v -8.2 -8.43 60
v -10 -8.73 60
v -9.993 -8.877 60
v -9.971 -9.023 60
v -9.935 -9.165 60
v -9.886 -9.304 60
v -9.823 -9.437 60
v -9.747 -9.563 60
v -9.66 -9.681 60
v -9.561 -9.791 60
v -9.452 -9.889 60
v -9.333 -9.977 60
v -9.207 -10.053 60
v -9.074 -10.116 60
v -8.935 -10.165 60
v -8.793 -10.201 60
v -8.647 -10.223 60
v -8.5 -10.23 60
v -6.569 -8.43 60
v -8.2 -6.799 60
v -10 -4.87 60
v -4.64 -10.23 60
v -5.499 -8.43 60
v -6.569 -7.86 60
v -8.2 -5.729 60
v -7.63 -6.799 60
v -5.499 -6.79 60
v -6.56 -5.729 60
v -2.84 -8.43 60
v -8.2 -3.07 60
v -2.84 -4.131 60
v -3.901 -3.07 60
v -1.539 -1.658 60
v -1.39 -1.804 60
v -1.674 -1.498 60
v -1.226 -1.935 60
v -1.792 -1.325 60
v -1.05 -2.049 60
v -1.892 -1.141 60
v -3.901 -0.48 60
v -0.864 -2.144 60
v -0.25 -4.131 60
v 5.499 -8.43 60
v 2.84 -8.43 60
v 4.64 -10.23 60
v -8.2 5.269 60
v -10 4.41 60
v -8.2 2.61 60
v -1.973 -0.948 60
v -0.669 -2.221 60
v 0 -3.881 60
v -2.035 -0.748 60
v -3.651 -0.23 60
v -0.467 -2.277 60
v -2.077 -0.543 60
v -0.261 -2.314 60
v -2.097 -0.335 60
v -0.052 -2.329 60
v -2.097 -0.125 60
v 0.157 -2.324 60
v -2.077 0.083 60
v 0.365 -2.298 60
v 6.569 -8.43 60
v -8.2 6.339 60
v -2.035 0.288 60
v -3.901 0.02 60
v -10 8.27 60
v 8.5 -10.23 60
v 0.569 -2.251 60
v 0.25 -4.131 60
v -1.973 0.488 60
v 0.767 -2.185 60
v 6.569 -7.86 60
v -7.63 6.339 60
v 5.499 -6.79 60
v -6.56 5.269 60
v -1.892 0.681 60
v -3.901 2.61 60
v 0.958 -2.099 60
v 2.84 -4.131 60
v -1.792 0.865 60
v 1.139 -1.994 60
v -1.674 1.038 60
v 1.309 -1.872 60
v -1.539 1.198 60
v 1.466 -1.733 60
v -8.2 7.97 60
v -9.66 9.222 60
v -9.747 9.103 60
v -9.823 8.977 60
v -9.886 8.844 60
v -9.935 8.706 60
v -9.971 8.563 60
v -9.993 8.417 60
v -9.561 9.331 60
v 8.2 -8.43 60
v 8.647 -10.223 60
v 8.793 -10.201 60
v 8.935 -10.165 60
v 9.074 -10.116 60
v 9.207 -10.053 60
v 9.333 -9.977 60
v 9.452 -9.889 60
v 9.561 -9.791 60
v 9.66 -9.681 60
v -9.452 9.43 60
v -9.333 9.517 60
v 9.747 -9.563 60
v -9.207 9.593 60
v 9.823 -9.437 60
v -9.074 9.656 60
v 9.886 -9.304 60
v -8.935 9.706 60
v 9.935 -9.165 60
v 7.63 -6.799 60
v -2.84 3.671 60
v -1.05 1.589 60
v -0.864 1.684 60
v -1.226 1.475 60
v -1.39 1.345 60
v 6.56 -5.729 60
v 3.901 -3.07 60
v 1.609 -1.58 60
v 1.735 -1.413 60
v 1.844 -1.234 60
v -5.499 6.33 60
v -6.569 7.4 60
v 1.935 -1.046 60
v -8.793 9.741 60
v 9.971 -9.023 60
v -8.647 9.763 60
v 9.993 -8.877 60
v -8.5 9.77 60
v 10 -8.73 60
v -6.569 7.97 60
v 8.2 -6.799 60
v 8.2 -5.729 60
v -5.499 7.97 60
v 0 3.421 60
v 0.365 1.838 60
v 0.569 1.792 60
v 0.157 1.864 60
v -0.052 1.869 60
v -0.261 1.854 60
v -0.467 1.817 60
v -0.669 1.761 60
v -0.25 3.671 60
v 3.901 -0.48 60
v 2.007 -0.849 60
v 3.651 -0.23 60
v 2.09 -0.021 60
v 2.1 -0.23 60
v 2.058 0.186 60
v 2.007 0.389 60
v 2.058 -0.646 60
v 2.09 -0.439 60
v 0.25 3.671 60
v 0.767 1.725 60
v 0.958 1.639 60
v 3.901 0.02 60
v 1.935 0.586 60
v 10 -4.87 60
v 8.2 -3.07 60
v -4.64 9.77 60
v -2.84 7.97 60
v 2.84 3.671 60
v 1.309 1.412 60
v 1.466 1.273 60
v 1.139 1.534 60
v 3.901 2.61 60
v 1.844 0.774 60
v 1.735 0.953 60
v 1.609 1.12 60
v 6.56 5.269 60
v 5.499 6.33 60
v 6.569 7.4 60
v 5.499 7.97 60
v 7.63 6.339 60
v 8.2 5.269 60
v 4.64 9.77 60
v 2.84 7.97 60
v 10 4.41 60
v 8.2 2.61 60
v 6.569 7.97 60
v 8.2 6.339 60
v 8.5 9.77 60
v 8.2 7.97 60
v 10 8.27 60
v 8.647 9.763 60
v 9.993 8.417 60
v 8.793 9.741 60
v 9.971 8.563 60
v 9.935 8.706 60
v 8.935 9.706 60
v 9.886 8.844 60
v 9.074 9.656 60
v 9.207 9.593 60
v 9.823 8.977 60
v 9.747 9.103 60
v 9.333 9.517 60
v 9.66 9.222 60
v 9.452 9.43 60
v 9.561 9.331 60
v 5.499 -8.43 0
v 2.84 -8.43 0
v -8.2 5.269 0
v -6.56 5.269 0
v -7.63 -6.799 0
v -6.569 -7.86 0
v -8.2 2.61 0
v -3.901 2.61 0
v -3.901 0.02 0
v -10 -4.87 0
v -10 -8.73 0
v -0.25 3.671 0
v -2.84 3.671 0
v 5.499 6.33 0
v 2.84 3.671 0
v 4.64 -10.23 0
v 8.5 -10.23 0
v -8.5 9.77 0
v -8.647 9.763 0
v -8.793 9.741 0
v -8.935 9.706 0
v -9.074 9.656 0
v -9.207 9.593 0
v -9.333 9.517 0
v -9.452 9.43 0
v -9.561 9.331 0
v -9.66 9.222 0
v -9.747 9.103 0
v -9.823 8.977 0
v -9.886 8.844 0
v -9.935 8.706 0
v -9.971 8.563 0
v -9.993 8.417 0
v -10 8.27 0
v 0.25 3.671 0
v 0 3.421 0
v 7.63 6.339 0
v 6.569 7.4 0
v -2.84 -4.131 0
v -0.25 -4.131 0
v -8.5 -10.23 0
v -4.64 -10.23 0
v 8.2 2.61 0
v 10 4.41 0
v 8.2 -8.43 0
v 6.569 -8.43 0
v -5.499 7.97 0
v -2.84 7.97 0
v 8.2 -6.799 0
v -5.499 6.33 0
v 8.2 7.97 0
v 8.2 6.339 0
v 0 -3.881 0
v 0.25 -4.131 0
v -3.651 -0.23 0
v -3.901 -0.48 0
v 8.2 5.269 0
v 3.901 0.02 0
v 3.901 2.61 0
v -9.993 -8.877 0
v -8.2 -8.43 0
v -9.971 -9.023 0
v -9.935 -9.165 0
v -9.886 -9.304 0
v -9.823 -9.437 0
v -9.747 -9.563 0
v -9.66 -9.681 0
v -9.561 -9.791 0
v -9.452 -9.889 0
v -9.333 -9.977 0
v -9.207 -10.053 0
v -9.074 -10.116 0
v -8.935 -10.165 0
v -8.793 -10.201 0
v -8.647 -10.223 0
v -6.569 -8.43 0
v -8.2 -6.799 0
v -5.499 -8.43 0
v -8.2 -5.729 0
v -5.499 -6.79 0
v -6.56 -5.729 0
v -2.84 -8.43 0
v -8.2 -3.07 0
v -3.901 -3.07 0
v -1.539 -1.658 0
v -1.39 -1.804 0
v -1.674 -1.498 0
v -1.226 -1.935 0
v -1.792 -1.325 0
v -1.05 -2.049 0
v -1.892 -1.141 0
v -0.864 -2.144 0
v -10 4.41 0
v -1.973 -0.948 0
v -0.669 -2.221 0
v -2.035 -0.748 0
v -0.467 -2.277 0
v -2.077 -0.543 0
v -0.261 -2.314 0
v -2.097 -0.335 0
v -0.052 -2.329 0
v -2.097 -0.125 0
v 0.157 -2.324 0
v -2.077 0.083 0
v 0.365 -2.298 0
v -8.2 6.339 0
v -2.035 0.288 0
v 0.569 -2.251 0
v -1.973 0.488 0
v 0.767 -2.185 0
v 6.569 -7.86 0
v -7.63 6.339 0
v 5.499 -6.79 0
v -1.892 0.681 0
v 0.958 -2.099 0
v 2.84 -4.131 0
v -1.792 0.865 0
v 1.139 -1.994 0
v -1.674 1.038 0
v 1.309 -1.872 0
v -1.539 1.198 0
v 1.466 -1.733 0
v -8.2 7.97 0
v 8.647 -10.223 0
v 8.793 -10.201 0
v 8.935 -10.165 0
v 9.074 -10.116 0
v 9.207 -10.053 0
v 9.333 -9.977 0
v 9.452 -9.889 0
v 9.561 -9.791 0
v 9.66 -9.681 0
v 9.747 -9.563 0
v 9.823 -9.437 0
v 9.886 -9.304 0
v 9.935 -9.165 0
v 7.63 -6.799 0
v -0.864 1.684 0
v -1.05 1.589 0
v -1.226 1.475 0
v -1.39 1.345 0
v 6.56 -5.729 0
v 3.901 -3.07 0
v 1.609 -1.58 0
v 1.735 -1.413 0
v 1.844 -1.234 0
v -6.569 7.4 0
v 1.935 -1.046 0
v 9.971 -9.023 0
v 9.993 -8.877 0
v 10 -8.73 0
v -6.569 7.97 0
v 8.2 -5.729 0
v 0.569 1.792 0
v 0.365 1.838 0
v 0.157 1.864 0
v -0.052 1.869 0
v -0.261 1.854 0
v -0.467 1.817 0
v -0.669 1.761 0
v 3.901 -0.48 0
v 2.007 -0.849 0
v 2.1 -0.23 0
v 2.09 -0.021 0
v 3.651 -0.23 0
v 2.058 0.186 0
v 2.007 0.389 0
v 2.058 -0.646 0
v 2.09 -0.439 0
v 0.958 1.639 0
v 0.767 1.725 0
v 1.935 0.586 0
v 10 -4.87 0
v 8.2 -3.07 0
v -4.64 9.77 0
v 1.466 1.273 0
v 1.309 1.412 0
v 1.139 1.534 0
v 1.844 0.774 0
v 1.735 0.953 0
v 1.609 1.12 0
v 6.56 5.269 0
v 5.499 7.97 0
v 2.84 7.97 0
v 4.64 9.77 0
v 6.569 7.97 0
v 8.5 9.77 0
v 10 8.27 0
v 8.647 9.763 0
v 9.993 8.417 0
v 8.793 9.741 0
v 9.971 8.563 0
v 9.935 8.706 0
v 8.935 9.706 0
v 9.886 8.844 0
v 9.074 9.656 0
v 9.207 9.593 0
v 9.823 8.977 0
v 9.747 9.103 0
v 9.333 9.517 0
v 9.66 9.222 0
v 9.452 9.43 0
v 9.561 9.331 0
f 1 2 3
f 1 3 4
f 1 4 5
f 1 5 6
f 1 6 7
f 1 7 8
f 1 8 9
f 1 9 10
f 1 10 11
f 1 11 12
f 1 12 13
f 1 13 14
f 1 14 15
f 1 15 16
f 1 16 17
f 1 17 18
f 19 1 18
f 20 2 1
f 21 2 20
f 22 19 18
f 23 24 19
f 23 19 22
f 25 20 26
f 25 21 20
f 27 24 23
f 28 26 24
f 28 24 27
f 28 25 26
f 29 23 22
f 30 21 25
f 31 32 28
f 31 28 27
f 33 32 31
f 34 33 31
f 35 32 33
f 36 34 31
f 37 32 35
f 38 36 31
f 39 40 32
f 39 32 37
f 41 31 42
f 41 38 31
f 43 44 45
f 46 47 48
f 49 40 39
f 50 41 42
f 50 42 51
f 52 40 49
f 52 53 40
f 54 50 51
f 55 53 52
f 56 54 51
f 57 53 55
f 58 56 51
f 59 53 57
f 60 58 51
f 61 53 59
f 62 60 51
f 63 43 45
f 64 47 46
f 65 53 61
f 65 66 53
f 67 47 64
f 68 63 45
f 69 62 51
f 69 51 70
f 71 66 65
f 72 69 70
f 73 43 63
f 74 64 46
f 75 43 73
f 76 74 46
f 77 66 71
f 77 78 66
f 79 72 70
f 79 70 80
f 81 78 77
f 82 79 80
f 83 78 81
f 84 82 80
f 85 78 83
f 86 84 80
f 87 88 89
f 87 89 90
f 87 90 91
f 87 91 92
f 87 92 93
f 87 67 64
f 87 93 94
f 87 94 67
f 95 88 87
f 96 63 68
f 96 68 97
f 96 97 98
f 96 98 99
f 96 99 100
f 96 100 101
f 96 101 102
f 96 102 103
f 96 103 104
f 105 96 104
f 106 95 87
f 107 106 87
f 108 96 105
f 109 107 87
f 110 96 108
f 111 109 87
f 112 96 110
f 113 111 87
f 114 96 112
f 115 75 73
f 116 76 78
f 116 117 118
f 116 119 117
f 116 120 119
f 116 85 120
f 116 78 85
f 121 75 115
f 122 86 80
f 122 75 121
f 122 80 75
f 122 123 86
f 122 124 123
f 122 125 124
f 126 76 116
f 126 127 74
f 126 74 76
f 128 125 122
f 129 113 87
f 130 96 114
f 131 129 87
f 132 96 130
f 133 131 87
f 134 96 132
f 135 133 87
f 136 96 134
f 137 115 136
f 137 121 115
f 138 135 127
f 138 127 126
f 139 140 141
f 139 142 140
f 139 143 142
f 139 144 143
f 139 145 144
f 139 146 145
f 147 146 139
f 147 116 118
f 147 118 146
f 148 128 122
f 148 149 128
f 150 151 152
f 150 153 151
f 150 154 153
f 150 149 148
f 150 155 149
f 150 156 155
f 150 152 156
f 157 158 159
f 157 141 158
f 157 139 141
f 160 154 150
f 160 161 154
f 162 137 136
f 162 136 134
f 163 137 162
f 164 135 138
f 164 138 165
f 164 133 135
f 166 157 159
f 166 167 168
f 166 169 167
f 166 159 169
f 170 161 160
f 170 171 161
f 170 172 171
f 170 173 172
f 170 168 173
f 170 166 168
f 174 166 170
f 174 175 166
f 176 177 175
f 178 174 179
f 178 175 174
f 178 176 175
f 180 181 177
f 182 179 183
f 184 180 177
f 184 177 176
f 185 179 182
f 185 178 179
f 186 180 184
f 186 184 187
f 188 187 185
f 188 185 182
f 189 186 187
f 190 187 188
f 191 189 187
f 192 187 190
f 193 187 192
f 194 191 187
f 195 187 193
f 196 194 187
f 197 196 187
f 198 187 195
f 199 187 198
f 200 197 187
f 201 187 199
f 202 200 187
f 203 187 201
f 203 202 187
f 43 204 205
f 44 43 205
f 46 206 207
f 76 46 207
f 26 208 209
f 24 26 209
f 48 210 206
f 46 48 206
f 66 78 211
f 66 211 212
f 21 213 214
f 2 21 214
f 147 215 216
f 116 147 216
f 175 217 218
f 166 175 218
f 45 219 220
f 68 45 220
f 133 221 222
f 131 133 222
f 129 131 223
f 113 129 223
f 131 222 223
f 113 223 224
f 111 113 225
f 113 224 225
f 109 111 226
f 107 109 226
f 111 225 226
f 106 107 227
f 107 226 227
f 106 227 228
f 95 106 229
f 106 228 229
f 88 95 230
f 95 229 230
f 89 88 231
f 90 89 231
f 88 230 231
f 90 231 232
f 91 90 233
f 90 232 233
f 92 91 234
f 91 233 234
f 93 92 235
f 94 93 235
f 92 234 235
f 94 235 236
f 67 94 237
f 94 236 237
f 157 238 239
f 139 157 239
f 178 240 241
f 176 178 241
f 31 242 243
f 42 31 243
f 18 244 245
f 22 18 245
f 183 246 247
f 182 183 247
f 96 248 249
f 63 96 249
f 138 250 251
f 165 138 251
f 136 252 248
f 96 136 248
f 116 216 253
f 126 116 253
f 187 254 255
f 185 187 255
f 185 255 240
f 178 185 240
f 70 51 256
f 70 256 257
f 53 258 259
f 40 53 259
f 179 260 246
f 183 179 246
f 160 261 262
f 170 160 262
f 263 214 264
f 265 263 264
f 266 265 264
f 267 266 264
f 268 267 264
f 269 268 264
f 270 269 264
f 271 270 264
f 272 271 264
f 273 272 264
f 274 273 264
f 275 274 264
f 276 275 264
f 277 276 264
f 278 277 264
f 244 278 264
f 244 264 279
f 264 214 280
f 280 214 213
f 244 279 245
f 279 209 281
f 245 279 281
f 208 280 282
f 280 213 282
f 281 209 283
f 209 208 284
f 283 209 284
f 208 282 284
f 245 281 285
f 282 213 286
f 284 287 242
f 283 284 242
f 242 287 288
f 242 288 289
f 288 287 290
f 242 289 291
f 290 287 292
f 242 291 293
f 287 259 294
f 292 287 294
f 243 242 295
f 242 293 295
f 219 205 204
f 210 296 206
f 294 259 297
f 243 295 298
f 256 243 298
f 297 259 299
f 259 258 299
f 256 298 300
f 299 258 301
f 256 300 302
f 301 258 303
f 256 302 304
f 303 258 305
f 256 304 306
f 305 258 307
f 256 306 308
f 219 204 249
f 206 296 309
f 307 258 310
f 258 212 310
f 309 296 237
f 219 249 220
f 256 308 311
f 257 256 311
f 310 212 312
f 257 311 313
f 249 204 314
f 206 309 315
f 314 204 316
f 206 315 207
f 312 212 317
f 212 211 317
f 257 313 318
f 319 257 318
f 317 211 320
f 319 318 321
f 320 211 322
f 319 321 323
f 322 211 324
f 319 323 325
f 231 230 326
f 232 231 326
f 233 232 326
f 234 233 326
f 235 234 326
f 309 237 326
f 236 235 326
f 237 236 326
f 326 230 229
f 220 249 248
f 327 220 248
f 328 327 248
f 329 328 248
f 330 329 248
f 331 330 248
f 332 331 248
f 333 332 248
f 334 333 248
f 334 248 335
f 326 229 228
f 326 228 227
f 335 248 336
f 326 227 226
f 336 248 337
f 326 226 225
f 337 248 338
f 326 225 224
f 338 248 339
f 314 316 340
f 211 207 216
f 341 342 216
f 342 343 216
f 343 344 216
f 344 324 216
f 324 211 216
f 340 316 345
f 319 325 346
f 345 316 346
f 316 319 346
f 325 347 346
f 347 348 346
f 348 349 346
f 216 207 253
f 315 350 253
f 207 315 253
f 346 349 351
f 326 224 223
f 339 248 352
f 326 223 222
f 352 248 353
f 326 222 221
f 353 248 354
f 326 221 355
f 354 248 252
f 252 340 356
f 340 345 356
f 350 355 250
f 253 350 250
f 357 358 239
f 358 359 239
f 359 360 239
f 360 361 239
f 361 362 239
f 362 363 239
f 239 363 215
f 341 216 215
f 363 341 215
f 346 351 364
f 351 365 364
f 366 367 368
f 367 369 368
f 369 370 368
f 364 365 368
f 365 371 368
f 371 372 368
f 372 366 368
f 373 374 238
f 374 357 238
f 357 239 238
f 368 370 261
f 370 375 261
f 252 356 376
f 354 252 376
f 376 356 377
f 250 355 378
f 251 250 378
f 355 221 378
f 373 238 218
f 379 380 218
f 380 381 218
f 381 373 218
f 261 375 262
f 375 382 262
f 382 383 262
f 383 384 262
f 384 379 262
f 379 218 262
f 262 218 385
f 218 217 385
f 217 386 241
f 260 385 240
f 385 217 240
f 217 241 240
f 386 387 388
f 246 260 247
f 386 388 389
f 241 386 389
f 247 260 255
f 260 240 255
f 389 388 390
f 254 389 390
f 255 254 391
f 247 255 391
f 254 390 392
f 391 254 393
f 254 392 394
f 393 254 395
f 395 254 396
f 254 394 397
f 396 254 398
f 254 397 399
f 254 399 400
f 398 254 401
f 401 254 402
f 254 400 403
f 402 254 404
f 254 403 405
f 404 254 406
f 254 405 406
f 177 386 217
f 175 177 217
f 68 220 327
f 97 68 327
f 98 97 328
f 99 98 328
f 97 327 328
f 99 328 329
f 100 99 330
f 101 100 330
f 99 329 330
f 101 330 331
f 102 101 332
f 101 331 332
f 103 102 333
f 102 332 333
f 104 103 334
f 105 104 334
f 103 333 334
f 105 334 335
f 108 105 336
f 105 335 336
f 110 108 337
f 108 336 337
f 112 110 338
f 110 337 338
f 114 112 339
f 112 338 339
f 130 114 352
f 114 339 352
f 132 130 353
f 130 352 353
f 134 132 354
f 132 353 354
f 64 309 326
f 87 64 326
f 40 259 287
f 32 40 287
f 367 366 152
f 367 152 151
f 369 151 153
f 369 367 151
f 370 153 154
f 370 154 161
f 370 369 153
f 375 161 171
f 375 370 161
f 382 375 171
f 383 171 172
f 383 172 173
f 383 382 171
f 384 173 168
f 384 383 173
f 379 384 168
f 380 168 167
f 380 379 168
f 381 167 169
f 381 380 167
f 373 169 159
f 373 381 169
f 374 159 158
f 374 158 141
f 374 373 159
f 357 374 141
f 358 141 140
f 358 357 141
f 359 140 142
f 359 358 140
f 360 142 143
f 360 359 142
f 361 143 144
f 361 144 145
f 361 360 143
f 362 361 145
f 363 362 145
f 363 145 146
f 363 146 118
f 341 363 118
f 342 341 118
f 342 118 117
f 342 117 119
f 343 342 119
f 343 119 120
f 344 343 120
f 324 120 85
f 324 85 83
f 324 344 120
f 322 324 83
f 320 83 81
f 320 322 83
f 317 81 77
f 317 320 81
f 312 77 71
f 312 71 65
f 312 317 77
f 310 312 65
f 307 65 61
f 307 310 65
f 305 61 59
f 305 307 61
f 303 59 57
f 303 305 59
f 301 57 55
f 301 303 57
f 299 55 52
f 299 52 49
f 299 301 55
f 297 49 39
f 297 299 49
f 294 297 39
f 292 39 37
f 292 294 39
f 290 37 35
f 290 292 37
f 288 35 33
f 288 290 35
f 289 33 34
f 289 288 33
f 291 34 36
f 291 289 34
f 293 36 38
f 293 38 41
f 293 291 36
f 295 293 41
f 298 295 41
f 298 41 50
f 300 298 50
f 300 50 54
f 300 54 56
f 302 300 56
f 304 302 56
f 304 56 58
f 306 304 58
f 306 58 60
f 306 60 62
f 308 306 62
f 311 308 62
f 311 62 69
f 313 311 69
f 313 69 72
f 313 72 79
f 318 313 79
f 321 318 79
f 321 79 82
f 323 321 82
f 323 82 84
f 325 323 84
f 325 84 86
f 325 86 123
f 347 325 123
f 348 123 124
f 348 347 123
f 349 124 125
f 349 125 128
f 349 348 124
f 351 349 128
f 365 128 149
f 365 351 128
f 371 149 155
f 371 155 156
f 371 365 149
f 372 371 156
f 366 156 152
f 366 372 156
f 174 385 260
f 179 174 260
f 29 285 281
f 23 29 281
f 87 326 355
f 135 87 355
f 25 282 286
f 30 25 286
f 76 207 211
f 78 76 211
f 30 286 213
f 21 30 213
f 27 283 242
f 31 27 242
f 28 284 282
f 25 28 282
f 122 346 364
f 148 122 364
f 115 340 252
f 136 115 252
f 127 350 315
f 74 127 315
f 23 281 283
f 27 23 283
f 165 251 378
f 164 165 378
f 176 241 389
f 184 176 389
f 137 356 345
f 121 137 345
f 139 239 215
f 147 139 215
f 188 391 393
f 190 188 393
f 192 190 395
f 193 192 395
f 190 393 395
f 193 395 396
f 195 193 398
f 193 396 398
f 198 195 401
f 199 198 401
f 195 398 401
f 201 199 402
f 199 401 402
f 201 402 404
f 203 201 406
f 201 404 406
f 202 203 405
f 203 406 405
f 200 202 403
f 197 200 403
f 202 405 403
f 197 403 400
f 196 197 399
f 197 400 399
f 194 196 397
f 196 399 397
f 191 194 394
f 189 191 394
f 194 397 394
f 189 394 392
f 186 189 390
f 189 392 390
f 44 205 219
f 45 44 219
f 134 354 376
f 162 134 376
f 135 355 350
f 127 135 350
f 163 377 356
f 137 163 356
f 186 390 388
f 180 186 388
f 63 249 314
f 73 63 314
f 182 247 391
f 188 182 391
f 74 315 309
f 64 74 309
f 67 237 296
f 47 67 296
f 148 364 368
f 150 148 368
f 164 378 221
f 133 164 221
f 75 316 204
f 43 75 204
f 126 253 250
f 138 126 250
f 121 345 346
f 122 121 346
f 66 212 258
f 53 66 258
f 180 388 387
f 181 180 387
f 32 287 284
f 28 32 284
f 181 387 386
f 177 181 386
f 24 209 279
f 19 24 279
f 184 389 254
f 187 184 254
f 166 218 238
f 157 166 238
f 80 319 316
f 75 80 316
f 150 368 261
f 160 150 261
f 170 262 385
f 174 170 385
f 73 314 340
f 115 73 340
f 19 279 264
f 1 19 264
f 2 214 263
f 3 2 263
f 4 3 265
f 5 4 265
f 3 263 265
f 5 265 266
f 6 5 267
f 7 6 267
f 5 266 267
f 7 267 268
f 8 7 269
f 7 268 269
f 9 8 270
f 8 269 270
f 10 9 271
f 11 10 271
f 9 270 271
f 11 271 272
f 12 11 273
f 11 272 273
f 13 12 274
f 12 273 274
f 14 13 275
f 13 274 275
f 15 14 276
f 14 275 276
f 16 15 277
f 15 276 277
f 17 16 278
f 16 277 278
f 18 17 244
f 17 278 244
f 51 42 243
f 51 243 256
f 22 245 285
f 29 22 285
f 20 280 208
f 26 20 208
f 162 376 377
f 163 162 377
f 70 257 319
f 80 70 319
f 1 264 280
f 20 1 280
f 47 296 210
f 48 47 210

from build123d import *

# Parameters (mm, degrees)
F0_R     = 2.1
F1_DEPTH = 60


with BuildPart() as f1:
    # F0 (on Top) → F1 (new body)
    with BuildSketch(Plane.XY):
        with BuildLine():
            Line((10, 4.410115), (10, 8.270115))
            ThreePointArc((10, 8.270115), (9.56066, 9.330775), (8.5, 9.770115))
            Line((8.5, 9.770115), (4.64, 9.770115))
            Line((4.64, 9.770115), (2.84, 7.970115))
            Line((2.84, 7.970115), (5.49934, 7.970115))
            Line((5.49934, 7.970115), (5.49934, 6.330115))
            Line((5.49934, 6.330115), (2.84, 3.670775))
            Line((2.84, 3.670775), (0.25, 3.670775))
            Line((0.25, 3.670775), (0, 3.420775))
            Line((0, 3.420775), (-0.25, 3.670775))
            Line((-0.25, 3.670775), (-2.84, 3.670775))
            Line((-2.84, 3.670775), (-5.49934, 6.330115))
            Line((-5.49934, 6.330115), (-5.49934, 7.970115))
            Line((-5.49934, 7.970115), (-2.84, 7.970115))
            Line((-2.84, 7.970115), (-4.64, 9.770115))
            Line((-4.64, 9.770115), (-8.5, 9.770115))
            ThreePointArc((-8.5, 9.770115), (-9.56066, 9.330775), (-10, 8.270115))
            Line((-10, 8.270115), (-10, 4.410115))
            Line((-10, 4.410115), (-8.2, 2.610115))
            Line((-8.2, 2.610115), (-8.2, 5.269455))
            Line((-8.2, 5.269455), (-6.56, 5.269455))
            Line((-6.56, 5.269455), (-3.90066, 2.610115))
            Line((-3.90066, 2.610115), (-3.90066, 0.020115))
            Line((-3.90066, 0.020115), (-3.65066, -0.229885))
            Line((-3.65066, -0.229885), (-3.90066, -0.479885))
            Line((-3.90066, -0.479885), (-3.90066, -3.069885))
            Line((-3.90066, -3.069885), (-6.56, -5.729225))
            Line((-6.56, -5.729225), (-8.2, -5.729225))
            Line((-8.2, -5.729225), (-8.2, -3.069885))
            Line((-8.2, -3.069885), (-10, -4.869885))
            Line((-10, -4.869885), (-10, -8.729885))
            ThreePointArc((-10, -8.729885), (-9.56066, -9.790545), (-8.5, -10.229885))
            Line((-8.5, -10.229885), (-4.64, -10.229885))
            Line((-4.64, -10.229885), (-2.84, -8.429885))
            Line((-2.84, -8.429885), (-5.49934, -8.429885))
            Line((-5.49934, -8.429885), (-5.49934, -6.789885))
            Line((-5.49934, -6.789885), (-2.84, -4.130545))
            Line((-2.84, -4.130545), (-0.25, -4.130545))
            Line((-0.25, -4.130545), (0, -3.880545))
            Line((0, -3.880545), (0.25, -4.130545))
            Line((0.25, -4.130545), (2.84, -4.130545))
            Line((2.84, -4.130545), (5.49934, -6.789885))
            Line((5.49934, -6.789885), (5.49934, -8.429885))
            Line((5.49934, -8.429885), (2.84, -8.429885))
            Line((2.84, -8.429885), (4.64, -10.229885))
            Line((4.64, -10.229885), (8.5, -10.229885))
            ThreePointArc((8.5, -10.229885), (9.56066, -9.790545), (10, -8.729885))
            Line((10, -8.729885), (10, -4.869885))
            Line((10, -4.869885), (8.2, -3.069885))
            Line((8.2, -3.069885), (8.2, -5.729225))
            Line((8.2, -5.729225), (6.56, -5.729225))
            Line((6.56, -5.729225), (3.90066, -3.069885))
            Line((3.90066, -3.069885), (3.90066, -0.479885))
            Line((3.90066, -0.479885), (3.65066, -0.229885))
            Line((3.65066, -0.229885), (3.90066, 0.020115))
            Line((3.90066, 0.020115), (3.90066, 2.610115))
            Line((3.90066, 2.610115), (6.56, 5.269455))
            Line((6.56, 5.269455), (8.2, 5.269455))
            Line((8.2, 5.269455), (8.2, 2.610115))
            Line((8.2, 2.610115), (10, 4.410115))
        make_face()
        Polygon((-6.56934, -7.859885), (-6.56934, -8.429885), (-8.2, -8.429885), (-8.2, -6.799225), (-7.63, -6.799225), align=None, mode=Mode.SUBTRACT)
        Polygon((8.2, -8.429885), (6.56934, -8.429885), (6.56934, -7.859885), (7.63, -6.799225), (8.2, -6.799225), align=None, mode=Mode.SUBTRACT)
        Polygon((-7.63, 6.339455), (-8.2, 6.339455), (-8.2, 7.970115), (-6.56934, 7.970115), (-6.56934, 7.400115), align=None, mode=Mode.SUBTRACT)
        with Locations((0, -0.229885)):
            Circle(F0_R, mode=Mode.SUBTRACT)
        Polygon((6.56934, 7.400115), (6.56934, 7.970115), (8.2, 7.970115), (8.2, 6.339455), (7.63, 6.339455), align=None, mode=Mode.SUBTRACT)
    extrude(amount=F1_DEPTH)


solid = f1.part
